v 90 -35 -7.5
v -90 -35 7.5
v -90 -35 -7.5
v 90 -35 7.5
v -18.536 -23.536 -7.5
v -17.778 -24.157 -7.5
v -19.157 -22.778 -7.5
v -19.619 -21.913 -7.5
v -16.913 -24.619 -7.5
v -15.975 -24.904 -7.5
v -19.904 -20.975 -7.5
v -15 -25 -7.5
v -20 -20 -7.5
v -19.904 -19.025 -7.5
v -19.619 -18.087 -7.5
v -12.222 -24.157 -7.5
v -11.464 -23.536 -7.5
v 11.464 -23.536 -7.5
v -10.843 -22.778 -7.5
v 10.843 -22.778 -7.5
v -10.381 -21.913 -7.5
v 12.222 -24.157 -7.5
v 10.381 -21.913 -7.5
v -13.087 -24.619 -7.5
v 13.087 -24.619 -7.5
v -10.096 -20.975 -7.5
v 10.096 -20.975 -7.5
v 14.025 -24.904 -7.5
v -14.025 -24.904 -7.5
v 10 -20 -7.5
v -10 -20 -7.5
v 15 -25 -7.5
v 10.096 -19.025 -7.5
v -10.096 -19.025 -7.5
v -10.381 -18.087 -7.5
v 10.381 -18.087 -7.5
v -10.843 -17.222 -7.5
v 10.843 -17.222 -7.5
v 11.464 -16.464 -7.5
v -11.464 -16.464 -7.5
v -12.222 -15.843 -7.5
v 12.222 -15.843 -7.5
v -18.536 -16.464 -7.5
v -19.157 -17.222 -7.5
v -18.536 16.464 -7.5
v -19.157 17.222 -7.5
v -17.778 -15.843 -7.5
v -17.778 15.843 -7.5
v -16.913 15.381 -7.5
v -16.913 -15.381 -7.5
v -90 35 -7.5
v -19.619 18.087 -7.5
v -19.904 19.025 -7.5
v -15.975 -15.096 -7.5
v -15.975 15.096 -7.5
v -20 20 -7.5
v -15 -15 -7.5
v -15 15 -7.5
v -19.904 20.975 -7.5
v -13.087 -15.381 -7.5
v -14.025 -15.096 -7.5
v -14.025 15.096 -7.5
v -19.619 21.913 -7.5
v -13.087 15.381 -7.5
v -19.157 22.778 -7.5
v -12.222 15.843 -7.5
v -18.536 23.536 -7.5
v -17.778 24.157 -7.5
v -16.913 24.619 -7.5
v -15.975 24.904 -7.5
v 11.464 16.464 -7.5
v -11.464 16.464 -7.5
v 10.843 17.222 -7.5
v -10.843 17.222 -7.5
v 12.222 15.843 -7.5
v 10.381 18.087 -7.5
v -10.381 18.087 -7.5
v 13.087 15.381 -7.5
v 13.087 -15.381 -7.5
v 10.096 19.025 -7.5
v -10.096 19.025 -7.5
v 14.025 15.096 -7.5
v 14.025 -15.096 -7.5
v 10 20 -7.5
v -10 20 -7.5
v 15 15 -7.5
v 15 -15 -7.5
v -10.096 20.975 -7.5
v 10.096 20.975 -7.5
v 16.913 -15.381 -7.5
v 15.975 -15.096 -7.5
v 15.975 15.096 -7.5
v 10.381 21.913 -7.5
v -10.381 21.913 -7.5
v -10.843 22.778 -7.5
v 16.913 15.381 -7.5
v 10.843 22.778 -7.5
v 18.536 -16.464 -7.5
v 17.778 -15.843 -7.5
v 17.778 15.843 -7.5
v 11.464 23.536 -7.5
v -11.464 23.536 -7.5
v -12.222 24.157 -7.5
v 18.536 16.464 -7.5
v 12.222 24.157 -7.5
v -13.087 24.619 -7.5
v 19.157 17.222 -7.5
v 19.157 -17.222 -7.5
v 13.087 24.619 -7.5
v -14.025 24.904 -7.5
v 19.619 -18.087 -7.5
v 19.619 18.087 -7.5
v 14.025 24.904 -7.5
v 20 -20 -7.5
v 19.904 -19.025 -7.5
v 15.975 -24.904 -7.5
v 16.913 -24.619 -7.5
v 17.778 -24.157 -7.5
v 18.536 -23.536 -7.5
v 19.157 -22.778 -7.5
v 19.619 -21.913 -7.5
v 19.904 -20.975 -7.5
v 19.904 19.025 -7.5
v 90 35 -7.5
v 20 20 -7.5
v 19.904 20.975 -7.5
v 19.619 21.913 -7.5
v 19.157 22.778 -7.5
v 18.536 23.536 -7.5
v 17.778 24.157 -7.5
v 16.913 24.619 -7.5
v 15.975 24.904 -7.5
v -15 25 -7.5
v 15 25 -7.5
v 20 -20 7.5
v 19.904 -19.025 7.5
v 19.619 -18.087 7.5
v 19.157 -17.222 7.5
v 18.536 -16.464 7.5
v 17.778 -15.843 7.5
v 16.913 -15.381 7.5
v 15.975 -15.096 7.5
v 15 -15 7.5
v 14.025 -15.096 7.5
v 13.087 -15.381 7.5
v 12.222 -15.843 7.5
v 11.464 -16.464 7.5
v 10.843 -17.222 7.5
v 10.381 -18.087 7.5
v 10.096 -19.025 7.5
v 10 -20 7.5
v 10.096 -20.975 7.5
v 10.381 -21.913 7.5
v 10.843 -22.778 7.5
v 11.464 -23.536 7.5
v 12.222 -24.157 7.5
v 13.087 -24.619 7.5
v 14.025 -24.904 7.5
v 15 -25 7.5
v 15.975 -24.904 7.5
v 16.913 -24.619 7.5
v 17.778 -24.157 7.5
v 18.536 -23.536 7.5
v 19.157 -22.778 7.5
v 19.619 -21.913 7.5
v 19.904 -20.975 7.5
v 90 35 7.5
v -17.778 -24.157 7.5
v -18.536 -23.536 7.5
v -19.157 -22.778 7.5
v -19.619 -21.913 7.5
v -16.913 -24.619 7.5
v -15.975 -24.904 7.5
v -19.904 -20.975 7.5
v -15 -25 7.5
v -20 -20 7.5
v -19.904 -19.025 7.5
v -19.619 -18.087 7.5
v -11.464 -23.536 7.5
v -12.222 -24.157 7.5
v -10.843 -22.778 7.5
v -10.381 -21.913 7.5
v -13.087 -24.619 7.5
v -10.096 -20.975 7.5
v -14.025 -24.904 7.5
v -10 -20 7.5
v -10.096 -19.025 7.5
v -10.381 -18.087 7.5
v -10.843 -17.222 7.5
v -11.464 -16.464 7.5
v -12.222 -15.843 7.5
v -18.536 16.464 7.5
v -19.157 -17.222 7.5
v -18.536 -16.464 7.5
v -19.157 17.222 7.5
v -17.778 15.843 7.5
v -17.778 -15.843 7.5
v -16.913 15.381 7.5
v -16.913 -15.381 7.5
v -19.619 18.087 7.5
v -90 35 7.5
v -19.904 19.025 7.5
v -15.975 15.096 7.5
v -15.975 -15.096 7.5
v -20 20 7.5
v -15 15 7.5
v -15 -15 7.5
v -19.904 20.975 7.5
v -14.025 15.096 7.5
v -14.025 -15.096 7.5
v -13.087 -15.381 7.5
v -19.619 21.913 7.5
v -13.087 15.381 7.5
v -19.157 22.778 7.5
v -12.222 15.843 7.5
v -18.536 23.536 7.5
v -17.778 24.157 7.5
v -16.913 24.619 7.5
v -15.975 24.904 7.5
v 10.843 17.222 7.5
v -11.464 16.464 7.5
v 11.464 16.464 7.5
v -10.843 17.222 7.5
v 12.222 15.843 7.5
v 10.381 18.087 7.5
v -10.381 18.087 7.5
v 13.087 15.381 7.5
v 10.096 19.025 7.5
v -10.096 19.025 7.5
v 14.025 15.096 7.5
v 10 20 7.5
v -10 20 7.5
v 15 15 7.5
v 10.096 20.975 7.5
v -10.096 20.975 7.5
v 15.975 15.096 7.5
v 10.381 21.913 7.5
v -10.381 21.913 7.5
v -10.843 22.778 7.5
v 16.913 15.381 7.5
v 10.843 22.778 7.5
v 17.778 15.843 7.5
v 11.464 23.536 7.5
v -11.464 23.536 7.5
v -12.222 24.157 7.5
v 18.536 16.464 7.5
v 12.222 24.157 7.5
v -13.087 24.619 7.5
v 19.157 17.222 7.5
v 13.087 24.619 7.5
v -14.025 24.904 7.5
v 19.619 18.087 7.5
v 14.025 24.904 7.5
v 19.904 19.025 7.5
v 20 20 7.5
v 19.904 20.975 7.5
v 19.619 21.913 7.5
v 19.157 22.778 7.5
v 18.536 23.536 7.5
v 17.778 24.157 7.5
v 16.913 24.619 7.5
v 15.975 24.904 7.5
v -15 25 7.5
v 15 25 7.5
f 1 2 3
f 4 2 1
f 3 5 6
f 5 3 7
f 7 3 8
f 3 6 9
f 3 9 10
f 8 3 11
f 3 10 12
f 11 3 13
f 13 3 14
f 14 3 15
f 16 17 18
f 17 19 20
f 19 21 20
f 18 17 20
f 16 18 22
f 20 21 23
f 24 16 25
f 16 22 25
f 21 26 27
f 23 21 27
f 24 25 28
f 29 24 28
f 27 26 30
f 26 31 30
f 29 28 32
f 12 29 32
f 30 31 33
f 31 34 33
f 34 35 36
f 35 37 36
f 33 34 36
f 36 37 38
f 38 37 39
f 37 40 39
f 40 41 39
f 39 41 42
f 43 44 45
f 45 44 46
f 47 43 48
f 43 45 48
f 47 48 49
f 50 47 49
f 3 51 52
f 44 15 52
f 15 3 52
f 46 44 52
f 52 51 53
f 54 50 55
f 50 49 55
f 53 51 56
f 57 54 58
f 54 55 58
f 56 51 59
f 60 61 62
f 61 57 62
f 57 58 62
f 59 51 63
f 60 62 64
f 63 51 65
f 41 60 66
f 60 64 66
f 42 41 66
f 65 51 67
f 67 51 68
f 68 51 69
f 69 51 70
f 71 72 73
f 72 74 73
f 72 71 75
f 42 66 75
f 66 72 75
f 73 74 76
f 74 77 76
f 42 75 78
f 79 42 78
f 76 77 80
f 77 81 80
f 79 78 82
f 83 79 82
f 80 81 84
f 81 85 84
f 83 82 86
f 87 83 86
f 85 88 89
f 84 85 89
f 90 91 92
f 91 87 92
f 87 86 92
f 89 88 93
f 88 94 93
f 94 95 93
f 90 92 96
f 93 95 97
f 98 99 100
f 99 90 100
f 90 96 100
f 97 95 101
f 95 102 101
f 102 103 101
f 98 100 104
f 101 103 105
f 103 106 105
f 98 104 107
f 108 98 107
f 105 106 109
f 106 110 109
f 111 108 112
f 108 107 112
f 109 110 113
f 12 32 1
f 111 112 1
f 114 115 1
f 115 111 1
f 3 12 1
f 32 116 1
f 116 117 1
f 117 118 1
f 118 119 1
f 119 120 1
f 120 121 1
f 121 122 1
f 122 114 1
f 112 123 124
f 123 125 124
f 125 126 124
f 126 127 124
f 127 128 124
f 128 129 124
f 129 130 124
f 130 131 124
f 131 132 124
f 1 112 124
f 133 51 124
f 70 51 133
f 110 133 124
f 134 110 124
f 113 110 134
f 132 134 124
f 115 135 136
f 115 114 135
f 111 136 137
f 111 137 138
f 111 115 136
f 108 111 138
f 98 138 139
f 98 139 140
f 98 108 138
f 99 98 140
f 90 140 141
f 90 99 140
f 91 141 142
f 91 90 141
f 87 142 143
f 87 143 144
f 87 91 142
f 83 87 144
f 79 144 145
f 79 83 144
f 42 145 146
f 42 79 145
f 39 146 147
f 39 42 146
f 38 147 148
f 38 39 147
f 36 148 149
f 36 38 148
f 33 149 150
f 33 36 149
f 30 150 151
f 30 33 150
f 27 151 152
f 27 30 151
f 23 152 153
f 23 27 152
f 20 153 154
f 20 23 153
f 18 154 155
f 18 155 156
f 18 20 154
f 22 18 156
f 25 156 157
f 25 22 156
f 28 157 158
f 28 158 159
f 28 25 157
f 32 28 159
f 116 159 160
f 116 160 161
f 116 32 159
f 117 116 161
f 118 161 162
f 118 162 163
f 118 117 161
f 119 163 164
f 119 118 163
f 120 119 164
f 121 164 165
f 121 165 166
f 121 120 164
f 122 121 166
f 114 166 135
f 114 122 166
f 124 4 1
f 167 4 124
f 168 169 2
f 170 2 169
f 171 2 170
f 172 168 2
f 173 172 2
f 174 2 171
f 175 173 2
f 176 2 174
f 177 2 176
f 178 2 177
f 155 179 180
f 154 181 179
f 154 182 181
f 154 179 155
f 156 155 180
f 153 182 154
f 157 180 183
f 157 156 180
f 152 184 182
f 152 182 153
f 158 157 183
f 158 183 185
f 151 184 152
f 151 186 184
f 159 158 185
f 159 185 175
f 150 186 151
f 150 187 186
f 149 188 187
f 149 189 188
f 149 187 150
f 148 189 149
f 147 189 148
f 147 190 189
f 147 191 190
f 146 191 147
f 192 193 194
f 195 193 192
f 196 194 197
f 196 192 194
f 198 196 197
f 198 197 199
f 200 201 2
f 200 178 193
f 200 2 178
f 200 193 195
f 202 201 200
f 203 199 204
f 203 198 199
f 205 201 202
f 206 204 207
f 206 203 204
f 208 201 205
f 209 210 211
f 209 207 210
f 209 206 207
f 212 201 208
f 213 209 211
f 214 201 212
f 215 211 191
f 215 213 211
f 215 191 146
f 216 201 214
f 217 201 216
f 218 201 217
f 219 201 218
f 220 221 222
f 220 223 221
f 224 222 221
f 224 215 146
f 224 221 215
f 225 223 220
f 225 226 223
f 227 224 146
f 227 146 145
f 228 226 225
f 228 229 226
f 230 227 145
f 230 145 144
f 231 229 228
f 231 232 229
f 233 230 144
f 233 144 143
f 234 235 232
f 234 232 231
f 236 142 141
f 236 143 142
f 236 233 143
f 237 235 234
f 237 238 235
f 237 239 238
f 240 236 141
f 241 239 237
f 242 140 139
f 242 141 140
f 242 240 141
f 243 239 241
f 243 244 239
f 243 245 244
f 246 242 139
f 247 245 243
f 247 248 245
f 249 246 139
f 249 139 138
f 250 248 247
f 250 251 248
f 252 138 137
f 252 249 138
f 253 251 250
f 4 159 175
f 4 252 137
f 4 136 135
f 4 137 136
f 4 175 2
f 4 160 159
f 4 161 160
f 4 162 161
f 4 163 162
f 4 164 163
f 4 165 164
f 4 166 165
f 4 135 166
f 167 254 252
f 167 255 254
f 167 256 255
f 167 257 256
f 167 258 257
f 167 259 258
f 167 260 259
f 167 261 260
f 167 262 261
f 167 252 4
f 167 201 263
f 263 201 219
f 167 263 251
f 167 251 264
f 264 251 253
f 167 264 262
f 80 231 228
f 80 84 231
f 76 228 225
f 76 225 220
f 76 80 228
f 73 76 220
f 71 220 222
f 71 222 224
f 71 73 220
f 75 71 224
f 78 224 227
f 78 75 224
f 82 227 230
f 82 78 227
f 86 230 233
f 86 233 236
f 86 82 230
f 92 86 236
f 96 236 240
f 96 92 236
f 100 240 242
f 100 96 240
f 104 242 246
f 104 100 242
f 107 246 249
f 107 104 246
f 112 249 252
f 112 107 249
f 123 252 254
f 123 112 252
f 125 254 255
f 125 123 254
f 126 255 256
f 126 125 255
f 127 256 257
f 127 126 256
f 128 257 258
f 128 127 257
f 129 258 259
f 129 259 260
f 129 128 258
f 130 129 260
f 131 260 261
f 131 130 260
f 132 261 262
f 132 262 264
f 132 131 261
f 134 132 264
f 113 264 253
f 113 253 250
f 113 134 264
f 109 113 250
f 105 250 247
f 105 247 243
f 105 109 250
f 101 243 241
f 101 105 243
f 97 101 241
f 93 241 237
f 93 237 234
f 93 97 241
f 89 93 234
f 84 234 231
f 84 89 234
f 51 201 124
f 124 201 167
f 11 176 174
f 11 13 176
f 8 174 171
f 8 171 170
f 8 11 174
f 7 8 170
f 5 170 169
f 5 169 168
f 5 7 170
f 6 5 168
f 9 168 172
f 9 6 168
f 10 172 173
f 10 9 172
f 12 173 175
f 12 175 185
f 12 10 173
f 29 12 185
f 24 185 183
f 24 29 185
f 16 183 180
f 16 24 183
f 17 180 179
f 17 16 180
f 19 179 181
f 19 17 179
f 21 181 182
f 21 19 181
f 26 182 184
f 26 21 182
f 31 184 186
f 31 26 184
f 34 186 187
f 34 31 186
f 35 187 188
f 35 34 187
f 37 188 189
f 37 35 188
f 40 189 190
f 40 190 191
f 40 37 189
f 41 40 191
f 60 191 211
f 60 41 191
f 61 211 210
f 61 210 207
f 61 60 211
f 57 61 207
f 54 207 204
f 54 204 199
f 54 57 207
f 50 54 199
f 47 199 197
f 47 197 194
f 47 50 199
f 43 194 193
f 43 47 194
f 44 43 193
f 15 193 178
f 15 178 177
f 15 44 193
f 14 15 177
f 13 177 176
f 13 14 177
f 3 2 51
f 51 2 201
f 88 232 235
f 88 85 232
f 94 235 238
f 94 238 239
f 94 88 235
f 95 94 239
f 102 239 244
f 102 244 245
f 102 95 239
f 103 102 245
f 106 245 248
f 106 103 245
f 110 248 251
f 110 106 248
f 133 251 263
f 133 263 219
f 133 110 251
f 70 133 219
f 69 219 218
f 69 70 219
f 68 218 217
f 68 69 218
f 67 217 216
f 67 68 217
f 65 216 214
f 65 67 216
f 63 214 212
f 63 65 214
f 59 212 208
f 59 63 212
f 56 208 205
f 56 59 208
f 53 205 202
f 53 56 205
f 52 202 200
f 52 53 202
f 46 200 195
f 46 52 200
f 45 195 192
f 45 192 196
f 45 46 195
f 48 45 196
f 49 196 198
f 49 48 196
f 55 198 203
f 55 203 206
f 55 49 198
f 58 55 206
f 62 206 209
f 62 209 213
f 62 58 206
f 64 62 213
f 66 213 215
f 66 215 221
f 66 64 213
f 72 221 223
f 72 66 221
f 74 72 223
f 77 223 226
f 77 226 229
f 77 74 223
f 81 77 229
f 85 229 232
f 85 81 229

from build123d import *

# Parameters (mm, degrees)
SKETCH_1_W      = 180
SKETCH_1_H      = 70
SKETCH_1_R      = 5
EXTRUDE_1_DEPTH = 7.5


with BuildPart() as part:
    # 草图1 → 凸台-拉伸1 (new, symmetric)
    with BuildSketch(Plane.XY):
        Rectangle(SKETCH_1_W, SKETCH_1_H)
        with Locations((-15, 20)):
            Circle(SKETCH_1_R, mode=Mode.SUBTRACT)
        with Locations(Location((15, 20, 0), (0, 0, 180))):
            Circle(SKETCH_1_R, mode=Mode.SUBTRACT)
        with Locations((15, -20)):
            Circle(SKETCH_1_R, mode=Mode.SUBTRACT)
        with Locations(Location((-15, -20, 0), (0, 0, 180))):
            Circle(SKETCH_1_R, mode=Mode.SUBTRACT)
    extrude(amount=EXTRUDE_1_DEPTH, both=True)


solid = part.part
